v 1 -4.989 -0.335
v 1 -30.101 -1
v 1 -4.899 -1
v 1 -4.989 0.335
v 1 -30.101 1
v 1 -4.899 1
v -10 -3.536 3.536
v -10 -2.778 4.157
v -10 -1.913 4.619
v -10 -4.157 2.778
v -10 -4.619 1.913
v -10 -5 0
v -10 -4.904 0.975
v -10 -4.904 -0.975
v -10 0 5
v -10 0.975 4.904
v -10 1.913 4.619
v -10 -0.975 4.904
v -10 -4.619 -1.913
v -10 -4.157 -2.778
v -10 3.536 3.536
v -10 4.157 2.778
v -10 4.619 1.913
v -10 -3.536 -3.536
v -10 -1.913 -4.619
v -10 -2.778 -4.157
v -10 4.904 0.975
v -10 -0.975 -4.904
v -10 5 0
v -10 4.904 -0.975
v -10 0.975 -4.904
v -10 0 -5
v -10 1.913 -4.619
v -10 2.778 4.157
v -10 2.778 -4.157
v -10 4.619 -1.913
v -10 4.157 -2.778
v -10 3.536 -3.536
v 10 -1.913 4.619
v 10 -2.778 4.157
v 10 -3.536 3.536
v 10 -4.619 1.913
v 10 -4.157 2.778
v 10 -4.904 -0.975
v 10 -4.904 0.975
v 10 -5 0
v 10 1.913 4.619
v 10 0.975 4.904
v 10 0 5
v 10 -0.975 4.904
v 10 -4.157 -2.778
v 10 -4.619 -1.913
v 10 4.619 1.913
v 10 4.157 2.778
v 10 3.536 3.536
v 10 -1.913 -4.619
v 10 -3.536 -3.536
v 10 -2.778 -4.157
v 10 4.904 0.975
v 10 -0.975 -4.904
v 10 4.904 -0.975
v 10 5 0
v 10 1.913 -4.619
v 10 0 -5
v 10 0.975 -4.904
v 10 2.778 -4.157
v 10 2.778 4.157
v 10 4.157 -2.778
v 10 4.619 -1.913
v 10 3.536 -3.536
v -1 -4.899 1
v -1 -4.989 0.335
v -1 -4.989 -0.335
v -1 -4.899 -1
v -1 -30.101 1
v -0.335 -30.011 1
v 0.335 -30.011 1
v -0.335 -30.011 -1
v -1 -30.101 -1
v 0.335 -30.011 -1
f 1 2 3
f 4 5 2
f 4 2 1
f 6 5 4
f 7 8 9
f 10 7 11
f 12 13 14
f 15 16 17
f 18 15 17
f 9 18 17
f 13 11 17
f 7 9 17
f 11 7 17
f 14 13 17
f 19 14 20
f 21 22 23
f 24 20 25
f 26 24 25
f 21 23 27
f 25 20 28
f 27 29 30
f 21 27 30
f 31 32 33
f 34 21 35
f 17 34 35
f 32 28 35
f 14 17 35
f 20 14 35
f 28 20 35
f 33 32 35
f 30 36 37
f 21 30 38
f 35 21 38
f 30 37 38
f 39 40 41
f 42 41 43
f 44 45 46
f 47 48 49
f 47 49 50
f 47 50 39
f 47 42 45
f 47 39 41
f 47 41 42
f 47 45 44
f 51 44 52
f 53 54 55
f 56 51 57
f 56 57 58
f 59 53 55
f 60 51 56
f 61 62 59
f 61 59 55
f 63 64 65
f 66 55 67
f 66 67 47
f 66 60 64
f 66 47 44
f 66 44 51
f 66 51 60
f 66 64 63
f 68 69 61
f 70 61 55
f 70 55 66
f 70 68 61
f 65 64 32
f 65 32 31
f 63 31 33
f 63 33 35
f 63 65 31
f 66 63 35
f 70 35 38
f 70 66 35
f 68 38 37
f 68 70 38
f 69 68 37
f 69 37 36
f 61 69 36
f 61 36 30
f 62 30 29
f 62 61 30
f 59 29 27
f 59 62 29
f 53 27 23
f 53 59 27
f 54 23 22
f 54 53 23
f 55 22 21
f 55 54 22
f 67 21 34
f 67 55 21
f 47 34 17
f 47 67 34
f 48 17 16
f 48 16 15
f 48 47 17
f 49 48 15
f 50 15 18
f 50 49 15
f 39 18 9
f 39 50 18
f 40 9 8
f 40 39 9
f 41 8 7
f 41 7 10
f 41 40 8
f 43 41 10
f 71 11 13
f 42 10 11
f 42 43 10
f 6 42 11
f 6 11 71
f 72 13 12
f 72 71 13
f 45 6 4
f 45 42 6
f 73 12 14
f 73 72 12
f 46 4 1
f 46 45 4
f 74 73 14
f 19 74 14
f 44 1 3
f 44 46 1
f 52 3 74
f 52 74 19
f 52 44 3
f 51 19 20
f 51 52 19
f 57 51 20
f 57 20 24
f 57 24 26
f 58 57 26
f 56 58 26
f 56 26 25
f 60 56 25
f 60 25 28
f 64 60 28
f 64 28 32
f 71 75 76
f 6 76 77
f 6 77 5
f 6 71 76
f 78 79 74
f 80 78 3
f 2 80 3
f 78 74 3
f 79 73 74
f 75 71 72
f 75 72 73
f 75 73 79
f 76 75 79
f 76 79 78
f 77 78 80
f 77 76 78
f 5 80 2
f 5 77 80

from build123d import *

# Parameters (mm, degrees)
SKETCH1_R           = 5
BOSS_EXTRUDE1_DEPTH = 10
BOSS_EXTRUDE2_DEPTH = 1


with BuildPart() as part:
    # Sketch1 → Boss-Extrude1 (new, symmetric)
    with BuildSketch(Plane(origin=(0, 0, 0), x_dir=(0, 0, -1), z_dir=(1, 0, 0))):
        Circle(SKETCH1_R)
    extrude(amount=BOSS_EXTRUDE1_DEPTH, both=True)

    # Sketch2 → Boss-Extrude2 (add, symmetric)
    with BuildSketch(Plane.XY):
        with BuildLine():
            Line((1, 0), (-1, 0))
            Line((-1, 0), (-1, -30.101020514))
            ThreePointArc((-1, -30.101020514), (0, -30), (1, -30.101020514))
            Line((1, -30.101020514), (1, 0))
        make_face()
    extrude(amount=BOSS_EXTRUDE2_DEPTH, both=True)


solid = part.part
